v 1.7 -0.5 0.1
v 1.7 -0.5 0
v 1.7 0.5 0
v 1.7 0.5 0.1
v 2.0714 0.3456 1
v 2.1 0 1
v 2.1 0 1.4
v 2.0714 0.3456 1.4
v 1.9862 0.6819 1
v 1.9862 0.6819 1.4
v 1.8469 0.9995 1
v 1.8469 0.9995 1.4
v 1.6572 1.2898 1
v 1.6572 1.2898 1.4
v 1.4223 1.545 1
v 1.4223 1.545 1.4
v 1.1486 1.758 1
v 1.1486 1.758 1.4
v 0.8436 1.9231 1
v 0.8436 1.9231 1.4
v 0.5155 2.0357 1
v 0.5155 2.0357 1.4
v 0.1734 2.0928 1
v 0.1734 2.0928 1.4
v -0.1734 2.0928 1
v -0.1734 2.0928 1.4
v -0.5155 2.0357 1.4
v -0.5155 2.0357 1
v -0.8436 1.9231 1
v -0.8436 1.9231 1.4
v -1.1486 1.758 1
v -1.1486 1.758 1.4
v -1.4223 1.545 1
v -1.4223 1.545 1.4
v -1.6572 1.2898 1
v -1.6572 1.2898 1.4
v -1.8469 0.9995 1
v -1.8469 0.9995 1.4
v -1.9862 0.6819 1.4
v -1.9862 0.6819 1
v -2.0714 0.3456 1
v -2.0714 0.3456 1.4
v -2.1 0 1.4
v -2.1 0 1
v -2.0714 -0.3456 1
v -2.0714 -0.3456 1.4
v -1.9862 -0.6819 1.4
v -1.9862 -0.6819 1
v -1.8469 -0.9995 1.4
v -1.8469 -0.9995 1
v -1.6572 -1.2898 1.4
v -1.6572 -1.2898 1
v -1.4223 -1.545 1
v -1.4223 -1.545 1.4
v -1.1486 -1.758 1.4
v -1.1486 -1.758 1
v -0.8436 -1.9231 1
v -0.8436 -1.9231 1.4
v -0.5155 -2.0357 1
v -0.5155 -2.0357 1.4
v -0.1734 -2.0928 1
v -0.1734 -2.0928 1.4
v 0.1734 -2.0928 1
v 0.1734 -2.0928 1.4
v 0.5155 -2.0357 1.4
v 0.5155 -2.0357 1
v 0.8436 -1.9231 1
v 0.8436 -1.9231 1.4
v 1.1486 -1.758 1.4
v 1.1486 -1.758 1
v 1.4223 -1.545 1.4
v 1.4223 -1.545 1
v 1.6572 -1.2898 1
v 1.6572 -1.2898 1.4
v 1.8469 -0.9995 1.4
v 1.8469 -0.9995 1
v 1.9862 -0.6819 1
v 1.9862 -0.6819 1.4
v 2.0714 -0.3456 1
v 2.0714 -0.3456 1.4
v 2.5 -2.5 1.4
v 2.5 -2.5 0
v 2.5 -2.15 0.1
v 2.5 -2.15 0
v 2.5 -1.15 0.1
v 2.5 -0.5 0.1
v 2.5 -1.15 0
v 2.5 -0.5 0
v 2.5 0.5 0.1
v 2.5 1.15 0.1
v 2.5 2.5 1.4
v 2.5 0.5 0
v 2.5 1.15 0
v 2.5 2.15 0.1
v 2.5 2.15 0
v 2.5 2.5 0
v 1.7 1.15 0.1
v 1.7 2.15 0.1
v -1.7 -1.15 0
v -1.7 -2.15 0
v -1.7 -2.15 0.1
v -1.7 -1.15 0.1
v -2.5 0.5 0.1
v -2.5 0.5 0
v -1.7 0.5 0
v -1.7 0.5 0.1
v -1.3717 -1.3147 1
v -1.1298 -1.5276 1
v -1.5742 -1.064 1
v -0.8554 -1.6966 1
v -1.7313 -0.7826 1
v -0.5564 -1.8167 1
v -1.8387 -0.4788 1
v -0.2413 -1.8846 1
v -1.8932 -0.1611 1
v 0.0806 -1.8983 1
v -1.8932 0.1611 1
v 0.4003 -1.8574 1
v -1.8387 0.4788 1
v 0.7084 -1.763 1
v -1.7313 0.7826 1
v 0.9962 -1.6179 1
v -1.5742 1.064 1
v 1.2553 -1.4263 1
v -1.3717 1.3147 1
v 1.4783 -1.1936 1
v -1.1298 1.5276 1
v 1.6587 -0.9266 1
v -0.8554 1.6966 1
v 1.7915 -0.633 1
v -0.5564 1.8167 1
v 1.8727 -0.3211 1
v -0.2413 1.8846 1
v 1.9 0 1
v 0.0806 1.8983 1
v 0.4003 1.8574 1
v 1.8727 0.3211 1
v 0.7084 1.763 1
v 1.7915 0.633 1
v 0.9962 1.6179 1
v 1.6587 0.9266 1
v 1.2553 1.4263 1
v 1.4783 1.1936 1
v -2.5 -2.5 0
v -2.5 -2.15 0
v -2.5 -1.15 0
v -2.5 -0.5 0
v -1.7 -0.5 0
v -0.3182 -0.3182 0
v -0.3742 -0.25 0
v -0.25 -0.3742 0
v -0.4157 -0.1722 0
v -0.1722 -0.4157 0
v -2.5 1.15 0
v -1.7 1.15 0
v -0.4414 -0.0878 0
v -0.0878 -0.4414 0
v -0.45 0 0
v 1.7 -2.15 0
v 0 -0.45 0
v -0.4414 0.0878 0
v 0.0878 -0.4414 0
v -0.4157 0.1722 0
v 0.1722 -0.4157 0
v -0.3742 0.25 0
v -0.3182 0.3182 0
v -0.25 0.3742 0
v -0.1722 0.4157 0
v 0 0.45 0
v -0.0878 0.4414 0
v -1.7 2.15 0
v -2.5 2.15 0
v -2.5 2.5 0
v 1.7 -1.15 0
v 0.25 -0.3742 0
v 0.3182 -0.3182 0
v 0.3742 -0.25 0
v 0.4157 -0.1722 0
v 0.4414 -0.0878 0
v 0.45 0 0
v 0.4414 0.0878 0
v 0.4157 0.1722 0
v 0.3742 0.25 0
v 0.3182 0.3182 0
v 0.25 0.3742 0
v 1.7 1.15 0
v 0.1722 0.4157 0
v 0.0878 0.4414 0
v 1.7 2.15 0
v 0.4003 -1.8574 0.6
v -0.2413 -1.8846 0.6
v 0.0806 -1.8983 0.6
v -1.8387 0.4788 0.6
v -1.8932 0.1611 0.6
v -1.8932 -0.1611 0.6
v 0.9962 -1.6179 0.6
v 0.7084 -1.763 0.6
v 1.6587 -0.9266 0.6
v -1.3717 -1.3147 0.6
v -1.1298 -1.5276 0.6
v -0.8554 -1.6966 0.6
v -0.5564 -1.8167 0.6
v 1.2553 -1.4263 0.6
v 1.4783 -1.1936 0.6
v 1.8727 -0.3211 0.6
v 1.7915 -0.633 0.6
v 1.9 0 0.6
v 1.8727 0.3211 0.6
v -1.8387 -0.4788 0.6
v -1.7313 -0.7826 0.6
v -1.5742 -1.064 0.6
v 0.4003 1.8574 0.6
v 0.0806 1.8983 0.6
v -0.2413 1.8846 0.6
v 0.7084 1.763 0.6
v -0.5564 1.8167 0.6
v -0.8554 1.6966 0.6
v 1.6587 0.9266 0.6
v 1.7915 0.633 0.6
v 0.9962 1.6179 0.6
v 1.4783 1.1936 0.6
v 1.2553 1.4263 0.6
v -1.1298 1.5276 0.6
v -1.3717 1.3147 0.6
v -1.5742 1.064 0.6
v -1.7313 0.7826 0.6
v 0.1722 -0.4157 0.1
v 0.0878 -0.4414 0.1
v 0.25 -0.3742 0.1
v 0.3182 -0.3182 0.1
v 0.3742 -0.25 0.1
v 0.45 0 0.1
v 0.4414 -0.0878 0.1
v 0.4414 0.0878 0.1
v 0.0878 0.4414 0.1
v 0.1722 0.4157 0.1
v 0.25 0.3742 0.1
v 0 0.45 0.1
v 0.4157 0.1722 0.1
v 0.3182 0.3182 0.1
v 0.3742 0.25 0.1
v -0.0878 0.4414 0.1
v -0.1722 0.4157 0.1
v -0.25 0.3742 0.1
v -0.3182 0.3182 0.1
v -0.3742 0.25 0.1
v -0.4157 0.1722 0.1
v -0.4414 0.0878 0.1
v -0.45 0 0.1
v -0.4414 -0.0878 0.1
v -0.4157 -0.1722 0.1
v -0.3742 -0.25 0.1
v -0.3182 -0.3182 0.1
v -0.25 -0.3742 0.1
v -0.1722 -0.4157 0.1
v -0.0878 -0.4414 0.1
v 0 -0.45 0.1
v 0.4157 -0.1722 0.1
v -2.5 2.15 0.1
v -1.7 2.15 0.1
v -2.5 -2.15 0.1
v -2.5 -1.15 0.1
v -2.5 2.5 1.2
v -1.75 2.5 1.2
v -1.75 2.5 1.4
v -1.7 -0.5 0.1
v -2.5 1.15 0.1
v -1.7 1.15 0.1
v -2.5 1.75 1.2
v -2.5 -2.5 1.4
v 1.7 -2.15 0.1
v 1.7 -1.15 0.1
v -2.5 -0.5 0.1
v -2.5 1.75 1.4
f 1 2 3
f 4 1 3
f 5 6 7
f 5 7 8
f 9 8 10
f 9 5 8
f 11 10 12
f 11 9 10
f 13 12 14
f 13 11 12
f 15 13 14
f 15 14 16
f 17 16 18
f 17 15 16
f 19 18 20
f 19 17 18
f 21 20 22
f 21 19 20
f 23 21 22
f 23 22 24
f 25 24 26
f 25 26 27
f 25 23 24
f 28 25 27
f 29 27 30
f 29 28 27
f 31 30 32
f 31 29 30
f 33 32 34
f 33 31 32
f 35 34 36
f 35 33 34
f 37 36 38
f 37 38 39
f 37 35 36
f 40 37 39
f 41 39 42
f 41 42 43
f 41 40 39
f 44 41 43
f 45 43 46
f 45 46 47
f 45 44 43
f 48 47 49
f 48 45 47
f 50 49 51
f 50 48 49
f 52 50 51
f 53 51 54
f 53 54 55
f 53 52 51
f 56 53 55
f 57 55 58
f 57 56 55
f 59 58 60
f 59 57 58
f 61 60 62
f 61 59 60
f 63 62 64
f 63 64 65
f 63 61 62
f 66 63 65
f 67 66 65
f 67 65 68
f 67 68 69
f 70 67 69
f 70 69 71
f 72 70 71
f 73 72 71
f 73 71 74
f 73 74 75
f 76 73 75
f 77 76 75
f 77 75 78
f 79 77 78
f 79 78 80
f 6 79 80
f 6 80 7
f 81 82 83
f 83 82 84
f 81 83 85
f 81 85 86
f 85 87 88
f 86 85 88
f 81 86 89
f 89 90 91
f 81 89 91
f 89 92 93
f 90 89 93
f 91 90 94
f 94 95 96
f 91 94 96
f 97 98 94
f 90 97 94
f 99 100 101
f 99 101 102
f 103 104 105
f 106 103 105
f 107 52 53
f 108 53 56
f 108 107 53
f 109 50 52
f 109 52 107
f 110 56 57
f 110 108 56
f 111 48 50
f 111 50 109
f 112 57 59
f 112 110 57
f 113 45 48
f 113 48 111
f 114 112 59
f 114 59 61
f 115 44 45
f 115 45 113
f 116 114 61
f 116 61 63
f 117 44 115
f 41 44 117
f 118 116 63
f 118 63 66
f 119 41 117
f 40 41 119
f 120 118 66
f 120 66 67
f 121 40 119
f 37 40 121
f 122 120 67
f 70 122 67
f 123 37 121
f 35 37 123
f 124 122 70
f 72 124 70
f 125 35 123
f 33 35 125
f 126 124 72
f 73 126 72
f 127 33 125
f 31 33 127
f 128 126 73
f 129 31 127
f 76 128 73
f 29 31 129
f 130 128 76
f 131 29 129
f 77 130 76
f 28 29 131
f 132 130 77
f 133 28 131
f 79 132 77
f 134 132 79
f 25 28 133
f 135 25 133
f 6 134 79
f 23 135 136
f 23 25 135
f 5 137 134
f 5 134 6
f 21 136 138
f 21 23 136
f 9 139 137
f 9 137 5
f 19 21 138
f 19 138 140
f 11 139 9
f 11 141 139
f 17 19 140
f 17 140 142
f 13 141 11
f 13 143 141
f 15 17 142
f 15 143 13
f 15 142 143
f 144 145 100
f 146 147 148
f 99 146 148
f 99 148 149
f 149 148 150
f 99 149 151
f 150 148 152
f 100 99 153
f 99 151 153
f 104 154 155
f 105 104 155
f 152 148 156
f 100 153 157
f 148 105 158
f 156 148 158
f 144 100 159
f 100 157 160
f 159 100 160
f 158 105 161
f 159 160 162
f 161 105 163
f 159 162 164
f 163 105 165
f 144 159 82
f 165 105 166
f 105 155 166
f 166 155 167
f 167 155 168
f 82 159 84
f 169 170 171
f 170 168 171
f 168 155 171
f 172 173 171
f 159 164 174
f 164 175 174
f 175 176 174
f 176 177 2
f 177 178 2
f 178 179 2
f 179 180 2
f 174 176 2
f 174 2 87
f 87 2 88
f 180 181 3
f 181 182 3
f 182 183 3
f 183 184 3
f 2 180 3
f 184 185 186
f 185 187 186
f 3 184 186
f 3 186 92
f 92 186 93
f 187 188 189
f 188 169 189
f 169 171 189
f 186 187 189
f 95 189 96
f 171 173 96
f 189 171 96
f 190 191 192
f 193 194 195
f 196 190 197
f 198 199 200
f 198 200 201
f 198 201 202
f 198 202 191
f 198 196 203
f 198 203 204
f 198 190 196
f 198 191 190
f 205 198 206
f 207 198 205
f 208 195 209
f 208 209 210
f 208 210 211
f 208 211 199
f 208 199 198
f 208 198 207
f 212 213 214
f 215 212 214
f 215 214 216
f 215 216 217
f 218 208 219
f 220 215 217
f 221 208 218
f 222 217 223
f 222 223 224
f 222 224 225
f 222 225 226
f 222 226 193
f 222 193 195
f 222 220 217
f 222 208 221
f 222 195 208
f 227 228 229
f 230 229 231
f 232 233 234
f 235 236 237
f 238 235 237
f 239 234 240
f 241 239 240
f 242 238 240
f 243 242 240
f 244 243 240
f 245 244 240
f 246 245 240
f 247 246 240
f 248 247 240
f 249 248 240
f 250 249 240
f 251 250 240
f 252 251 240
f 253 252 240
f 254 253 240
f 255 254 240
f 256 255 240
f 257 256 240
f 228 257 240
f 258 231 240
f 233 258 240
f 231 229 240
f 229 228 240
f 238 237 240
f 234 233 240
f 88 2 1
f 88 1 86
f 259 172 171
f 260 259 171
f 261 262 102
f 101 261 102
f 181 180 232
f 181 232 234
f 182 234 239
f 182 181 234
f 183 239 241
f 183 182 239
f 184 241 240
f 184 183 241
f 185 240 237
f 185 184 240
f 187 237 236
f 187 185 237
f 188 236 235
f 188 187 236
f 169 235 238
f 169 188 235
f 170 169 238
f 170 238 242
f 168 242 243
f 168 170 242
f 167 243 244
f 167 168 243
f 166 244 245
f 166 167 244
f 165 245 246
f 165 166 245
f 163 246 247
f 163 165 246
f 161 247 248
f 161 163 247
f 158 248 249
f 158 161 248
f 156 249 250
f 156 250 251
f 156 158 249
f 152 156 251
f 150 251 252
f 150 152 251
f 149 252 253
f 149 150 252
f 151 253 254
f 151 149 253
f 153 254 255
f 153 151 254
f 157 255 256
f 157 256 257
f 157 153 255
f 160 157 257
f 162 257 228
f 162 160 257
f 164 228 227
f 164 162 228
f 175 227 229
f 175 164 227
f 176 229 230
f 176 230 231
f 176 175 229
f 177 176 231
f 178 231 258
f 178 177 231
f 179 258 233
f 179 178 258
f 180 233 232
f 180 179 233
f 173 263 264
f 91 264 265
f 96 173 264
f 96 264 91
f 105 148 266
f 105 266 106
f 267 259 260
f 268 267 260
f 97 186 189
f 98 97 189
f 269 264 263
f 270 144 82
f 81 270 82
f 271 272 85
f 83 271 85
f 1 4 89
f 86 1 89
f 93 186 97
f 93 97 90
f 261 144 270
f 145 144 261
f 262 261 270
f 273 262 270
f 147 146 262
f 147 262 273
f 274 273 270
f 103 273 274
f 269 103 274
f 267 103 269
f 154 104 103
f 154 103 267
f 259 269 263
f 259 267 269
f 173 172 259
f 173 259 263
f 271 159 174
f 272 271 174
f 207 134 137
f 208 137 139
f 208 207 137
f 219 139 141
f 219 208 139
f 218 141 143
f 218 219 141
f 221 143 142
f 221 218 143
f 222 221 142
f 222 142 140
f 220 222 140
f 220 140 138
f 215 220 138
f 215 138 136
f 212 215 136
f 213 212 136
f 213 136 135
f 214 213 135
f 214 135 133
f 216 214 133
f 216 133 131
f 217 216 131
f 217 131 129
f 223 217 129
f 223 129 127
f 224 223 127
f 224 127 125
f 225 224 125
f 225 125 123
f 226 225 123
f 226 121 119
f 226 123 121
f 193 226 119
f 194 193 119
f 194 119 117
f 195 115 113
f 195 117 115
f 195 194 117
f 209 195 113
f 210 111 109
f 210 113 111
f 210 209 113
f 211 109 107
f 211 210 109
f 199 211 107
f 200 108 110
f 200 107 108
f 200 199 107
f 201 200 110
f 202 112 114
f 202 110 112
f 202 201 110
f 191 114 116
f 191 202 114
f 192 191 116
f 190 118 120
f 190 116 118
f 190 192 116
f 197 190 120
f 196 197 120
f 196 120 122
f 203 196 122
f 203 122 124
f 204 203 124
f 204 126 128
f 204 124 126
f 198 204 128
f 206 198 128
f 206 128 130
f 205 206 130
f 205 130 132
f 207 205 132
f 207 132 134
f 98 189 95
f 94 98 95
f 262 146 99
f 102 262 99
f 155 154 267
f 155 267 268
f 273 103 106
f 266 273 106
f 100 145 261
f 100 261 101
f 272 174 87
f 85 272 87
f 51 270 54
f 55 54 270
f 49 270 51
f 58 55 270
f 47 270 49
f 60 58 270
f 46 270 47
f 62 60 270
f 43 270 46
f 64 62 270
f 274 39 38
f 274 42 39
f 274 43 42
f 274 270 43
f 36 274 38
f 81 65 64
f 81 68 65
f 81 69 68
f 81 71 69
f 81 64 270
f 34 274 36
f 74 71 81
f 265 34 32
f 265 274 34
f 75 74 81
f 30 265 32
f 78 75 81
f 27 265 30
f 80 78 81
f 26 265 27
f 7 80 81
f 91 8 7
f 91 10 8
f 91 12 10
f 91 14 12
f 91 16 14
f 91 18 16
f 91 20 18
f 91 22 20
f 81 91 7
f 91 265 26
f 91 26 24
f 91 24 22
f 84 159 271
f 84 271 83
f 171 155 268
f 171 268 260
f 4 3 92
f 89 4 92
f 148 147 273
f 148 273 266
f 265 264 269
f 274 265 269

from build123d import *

# Parameters (mm, degrees)
SKETCH003_R       = 0.45
SKETCH003_W       = 0.8
SKETCH003_H       = 1
EXTRUDE002_DEPTH  = 0.1
EXTRUDE001_DEPTH  = 0.2
CYLINDER001_R     = 1.9
CYLINDER001_DEPTH = 0.8
CYLINDER_R        = 2.1
CYLINDER_DEPTH    = 0.4
SKETCH001_W       = 5
SKETCH001_H       = 5
EXTRUDE_DEPTH     = 1.4


with BuildPart() as bottomcutouts:
    # Sketch003 → Extrude002 (new body)
    with BuildSketch(Plane.XY):
        Circle(SKETCH003_R)
        with Locations((2.1, 0)):
            Rectangle(SKETCH003_W, SKETCH003_H)
        with Locations((2.1, 1.65)):
            Rectangle(SKETCH003_W, SKETCH003_H)
        with Locations((2.1, -1.65)):
            Rectangle(SKETCH003_W, SKETCH003_H)
        with Locations((-2.1, 0)):
            Rectangle(SKETCH003_W, SKETCH003_H)
        with Locations((-2.1, 1.65)):
            Rectangle(SKETCH003_W, SKETCH003_H)
        with Locations((-2.1, -1.65)):
            Rectangle(SKETCH003_W, SKETCH003_H)
    extrude(amount=EXTRUDE002_DEPTH)


with BuildPart() as trianglenotch:
    # Sketch002 → Extrude001 (new body)
    with BuildSketch(Plane.XY):
        Polygon((-2.5, 2.5), (-1.75, 2.5), (-2.5, 1.75), align=None)
    extrude(amount=EXTRUDE001_DEPTH)


with BuildPart() as trianglenotch_1:
    # Extrude001 placement: moved
    add(trianglenotch.part.moved(Location((0, 0, 1.2))))


with BuildPart() as peekhole:
    # Cylinder001 → Cylinder001 (new body)
    with BuildSketch(Plane.XY.offset(0.6)):
        Circle(CYLINDER001_R)
    extrude(amount=CYLINDER001_DEPTH)


with BuildPart() as lenshole:
    # Cylinder → Cylinder (new body)
    with BuildSketch(Plane.XY.offset(1)):
        Circle(CYLINDER_R)
    extrude(amount=CYLINDER_DEPTH)


with BuildPart() as plasticbody:
    # Sketch001 → Extrude (new body)
    with BuildSketch(Plane.XY):
        Rectangle(SKETCH001_W, SKETCH001_H)
    extrude(amount=EXTRUDE_DEPTH)

    # Cut: cut LensHole
    add(lenshole.part, mode=Mode.SUBTRACT)

    # Cut001: cut PeekHole
    add(peekhole.part, mode=Mode.SUBTRACT)

    # Cut002: cut TriangleNotch
    add(trianglenotch_1.part, mode=Mode.SUBTRACT)

    # Cut003: cut BottomCutouts
    add(bottomcutouts.part, mode=Mode.SUBTRACT)


solid = plasticbody.part
